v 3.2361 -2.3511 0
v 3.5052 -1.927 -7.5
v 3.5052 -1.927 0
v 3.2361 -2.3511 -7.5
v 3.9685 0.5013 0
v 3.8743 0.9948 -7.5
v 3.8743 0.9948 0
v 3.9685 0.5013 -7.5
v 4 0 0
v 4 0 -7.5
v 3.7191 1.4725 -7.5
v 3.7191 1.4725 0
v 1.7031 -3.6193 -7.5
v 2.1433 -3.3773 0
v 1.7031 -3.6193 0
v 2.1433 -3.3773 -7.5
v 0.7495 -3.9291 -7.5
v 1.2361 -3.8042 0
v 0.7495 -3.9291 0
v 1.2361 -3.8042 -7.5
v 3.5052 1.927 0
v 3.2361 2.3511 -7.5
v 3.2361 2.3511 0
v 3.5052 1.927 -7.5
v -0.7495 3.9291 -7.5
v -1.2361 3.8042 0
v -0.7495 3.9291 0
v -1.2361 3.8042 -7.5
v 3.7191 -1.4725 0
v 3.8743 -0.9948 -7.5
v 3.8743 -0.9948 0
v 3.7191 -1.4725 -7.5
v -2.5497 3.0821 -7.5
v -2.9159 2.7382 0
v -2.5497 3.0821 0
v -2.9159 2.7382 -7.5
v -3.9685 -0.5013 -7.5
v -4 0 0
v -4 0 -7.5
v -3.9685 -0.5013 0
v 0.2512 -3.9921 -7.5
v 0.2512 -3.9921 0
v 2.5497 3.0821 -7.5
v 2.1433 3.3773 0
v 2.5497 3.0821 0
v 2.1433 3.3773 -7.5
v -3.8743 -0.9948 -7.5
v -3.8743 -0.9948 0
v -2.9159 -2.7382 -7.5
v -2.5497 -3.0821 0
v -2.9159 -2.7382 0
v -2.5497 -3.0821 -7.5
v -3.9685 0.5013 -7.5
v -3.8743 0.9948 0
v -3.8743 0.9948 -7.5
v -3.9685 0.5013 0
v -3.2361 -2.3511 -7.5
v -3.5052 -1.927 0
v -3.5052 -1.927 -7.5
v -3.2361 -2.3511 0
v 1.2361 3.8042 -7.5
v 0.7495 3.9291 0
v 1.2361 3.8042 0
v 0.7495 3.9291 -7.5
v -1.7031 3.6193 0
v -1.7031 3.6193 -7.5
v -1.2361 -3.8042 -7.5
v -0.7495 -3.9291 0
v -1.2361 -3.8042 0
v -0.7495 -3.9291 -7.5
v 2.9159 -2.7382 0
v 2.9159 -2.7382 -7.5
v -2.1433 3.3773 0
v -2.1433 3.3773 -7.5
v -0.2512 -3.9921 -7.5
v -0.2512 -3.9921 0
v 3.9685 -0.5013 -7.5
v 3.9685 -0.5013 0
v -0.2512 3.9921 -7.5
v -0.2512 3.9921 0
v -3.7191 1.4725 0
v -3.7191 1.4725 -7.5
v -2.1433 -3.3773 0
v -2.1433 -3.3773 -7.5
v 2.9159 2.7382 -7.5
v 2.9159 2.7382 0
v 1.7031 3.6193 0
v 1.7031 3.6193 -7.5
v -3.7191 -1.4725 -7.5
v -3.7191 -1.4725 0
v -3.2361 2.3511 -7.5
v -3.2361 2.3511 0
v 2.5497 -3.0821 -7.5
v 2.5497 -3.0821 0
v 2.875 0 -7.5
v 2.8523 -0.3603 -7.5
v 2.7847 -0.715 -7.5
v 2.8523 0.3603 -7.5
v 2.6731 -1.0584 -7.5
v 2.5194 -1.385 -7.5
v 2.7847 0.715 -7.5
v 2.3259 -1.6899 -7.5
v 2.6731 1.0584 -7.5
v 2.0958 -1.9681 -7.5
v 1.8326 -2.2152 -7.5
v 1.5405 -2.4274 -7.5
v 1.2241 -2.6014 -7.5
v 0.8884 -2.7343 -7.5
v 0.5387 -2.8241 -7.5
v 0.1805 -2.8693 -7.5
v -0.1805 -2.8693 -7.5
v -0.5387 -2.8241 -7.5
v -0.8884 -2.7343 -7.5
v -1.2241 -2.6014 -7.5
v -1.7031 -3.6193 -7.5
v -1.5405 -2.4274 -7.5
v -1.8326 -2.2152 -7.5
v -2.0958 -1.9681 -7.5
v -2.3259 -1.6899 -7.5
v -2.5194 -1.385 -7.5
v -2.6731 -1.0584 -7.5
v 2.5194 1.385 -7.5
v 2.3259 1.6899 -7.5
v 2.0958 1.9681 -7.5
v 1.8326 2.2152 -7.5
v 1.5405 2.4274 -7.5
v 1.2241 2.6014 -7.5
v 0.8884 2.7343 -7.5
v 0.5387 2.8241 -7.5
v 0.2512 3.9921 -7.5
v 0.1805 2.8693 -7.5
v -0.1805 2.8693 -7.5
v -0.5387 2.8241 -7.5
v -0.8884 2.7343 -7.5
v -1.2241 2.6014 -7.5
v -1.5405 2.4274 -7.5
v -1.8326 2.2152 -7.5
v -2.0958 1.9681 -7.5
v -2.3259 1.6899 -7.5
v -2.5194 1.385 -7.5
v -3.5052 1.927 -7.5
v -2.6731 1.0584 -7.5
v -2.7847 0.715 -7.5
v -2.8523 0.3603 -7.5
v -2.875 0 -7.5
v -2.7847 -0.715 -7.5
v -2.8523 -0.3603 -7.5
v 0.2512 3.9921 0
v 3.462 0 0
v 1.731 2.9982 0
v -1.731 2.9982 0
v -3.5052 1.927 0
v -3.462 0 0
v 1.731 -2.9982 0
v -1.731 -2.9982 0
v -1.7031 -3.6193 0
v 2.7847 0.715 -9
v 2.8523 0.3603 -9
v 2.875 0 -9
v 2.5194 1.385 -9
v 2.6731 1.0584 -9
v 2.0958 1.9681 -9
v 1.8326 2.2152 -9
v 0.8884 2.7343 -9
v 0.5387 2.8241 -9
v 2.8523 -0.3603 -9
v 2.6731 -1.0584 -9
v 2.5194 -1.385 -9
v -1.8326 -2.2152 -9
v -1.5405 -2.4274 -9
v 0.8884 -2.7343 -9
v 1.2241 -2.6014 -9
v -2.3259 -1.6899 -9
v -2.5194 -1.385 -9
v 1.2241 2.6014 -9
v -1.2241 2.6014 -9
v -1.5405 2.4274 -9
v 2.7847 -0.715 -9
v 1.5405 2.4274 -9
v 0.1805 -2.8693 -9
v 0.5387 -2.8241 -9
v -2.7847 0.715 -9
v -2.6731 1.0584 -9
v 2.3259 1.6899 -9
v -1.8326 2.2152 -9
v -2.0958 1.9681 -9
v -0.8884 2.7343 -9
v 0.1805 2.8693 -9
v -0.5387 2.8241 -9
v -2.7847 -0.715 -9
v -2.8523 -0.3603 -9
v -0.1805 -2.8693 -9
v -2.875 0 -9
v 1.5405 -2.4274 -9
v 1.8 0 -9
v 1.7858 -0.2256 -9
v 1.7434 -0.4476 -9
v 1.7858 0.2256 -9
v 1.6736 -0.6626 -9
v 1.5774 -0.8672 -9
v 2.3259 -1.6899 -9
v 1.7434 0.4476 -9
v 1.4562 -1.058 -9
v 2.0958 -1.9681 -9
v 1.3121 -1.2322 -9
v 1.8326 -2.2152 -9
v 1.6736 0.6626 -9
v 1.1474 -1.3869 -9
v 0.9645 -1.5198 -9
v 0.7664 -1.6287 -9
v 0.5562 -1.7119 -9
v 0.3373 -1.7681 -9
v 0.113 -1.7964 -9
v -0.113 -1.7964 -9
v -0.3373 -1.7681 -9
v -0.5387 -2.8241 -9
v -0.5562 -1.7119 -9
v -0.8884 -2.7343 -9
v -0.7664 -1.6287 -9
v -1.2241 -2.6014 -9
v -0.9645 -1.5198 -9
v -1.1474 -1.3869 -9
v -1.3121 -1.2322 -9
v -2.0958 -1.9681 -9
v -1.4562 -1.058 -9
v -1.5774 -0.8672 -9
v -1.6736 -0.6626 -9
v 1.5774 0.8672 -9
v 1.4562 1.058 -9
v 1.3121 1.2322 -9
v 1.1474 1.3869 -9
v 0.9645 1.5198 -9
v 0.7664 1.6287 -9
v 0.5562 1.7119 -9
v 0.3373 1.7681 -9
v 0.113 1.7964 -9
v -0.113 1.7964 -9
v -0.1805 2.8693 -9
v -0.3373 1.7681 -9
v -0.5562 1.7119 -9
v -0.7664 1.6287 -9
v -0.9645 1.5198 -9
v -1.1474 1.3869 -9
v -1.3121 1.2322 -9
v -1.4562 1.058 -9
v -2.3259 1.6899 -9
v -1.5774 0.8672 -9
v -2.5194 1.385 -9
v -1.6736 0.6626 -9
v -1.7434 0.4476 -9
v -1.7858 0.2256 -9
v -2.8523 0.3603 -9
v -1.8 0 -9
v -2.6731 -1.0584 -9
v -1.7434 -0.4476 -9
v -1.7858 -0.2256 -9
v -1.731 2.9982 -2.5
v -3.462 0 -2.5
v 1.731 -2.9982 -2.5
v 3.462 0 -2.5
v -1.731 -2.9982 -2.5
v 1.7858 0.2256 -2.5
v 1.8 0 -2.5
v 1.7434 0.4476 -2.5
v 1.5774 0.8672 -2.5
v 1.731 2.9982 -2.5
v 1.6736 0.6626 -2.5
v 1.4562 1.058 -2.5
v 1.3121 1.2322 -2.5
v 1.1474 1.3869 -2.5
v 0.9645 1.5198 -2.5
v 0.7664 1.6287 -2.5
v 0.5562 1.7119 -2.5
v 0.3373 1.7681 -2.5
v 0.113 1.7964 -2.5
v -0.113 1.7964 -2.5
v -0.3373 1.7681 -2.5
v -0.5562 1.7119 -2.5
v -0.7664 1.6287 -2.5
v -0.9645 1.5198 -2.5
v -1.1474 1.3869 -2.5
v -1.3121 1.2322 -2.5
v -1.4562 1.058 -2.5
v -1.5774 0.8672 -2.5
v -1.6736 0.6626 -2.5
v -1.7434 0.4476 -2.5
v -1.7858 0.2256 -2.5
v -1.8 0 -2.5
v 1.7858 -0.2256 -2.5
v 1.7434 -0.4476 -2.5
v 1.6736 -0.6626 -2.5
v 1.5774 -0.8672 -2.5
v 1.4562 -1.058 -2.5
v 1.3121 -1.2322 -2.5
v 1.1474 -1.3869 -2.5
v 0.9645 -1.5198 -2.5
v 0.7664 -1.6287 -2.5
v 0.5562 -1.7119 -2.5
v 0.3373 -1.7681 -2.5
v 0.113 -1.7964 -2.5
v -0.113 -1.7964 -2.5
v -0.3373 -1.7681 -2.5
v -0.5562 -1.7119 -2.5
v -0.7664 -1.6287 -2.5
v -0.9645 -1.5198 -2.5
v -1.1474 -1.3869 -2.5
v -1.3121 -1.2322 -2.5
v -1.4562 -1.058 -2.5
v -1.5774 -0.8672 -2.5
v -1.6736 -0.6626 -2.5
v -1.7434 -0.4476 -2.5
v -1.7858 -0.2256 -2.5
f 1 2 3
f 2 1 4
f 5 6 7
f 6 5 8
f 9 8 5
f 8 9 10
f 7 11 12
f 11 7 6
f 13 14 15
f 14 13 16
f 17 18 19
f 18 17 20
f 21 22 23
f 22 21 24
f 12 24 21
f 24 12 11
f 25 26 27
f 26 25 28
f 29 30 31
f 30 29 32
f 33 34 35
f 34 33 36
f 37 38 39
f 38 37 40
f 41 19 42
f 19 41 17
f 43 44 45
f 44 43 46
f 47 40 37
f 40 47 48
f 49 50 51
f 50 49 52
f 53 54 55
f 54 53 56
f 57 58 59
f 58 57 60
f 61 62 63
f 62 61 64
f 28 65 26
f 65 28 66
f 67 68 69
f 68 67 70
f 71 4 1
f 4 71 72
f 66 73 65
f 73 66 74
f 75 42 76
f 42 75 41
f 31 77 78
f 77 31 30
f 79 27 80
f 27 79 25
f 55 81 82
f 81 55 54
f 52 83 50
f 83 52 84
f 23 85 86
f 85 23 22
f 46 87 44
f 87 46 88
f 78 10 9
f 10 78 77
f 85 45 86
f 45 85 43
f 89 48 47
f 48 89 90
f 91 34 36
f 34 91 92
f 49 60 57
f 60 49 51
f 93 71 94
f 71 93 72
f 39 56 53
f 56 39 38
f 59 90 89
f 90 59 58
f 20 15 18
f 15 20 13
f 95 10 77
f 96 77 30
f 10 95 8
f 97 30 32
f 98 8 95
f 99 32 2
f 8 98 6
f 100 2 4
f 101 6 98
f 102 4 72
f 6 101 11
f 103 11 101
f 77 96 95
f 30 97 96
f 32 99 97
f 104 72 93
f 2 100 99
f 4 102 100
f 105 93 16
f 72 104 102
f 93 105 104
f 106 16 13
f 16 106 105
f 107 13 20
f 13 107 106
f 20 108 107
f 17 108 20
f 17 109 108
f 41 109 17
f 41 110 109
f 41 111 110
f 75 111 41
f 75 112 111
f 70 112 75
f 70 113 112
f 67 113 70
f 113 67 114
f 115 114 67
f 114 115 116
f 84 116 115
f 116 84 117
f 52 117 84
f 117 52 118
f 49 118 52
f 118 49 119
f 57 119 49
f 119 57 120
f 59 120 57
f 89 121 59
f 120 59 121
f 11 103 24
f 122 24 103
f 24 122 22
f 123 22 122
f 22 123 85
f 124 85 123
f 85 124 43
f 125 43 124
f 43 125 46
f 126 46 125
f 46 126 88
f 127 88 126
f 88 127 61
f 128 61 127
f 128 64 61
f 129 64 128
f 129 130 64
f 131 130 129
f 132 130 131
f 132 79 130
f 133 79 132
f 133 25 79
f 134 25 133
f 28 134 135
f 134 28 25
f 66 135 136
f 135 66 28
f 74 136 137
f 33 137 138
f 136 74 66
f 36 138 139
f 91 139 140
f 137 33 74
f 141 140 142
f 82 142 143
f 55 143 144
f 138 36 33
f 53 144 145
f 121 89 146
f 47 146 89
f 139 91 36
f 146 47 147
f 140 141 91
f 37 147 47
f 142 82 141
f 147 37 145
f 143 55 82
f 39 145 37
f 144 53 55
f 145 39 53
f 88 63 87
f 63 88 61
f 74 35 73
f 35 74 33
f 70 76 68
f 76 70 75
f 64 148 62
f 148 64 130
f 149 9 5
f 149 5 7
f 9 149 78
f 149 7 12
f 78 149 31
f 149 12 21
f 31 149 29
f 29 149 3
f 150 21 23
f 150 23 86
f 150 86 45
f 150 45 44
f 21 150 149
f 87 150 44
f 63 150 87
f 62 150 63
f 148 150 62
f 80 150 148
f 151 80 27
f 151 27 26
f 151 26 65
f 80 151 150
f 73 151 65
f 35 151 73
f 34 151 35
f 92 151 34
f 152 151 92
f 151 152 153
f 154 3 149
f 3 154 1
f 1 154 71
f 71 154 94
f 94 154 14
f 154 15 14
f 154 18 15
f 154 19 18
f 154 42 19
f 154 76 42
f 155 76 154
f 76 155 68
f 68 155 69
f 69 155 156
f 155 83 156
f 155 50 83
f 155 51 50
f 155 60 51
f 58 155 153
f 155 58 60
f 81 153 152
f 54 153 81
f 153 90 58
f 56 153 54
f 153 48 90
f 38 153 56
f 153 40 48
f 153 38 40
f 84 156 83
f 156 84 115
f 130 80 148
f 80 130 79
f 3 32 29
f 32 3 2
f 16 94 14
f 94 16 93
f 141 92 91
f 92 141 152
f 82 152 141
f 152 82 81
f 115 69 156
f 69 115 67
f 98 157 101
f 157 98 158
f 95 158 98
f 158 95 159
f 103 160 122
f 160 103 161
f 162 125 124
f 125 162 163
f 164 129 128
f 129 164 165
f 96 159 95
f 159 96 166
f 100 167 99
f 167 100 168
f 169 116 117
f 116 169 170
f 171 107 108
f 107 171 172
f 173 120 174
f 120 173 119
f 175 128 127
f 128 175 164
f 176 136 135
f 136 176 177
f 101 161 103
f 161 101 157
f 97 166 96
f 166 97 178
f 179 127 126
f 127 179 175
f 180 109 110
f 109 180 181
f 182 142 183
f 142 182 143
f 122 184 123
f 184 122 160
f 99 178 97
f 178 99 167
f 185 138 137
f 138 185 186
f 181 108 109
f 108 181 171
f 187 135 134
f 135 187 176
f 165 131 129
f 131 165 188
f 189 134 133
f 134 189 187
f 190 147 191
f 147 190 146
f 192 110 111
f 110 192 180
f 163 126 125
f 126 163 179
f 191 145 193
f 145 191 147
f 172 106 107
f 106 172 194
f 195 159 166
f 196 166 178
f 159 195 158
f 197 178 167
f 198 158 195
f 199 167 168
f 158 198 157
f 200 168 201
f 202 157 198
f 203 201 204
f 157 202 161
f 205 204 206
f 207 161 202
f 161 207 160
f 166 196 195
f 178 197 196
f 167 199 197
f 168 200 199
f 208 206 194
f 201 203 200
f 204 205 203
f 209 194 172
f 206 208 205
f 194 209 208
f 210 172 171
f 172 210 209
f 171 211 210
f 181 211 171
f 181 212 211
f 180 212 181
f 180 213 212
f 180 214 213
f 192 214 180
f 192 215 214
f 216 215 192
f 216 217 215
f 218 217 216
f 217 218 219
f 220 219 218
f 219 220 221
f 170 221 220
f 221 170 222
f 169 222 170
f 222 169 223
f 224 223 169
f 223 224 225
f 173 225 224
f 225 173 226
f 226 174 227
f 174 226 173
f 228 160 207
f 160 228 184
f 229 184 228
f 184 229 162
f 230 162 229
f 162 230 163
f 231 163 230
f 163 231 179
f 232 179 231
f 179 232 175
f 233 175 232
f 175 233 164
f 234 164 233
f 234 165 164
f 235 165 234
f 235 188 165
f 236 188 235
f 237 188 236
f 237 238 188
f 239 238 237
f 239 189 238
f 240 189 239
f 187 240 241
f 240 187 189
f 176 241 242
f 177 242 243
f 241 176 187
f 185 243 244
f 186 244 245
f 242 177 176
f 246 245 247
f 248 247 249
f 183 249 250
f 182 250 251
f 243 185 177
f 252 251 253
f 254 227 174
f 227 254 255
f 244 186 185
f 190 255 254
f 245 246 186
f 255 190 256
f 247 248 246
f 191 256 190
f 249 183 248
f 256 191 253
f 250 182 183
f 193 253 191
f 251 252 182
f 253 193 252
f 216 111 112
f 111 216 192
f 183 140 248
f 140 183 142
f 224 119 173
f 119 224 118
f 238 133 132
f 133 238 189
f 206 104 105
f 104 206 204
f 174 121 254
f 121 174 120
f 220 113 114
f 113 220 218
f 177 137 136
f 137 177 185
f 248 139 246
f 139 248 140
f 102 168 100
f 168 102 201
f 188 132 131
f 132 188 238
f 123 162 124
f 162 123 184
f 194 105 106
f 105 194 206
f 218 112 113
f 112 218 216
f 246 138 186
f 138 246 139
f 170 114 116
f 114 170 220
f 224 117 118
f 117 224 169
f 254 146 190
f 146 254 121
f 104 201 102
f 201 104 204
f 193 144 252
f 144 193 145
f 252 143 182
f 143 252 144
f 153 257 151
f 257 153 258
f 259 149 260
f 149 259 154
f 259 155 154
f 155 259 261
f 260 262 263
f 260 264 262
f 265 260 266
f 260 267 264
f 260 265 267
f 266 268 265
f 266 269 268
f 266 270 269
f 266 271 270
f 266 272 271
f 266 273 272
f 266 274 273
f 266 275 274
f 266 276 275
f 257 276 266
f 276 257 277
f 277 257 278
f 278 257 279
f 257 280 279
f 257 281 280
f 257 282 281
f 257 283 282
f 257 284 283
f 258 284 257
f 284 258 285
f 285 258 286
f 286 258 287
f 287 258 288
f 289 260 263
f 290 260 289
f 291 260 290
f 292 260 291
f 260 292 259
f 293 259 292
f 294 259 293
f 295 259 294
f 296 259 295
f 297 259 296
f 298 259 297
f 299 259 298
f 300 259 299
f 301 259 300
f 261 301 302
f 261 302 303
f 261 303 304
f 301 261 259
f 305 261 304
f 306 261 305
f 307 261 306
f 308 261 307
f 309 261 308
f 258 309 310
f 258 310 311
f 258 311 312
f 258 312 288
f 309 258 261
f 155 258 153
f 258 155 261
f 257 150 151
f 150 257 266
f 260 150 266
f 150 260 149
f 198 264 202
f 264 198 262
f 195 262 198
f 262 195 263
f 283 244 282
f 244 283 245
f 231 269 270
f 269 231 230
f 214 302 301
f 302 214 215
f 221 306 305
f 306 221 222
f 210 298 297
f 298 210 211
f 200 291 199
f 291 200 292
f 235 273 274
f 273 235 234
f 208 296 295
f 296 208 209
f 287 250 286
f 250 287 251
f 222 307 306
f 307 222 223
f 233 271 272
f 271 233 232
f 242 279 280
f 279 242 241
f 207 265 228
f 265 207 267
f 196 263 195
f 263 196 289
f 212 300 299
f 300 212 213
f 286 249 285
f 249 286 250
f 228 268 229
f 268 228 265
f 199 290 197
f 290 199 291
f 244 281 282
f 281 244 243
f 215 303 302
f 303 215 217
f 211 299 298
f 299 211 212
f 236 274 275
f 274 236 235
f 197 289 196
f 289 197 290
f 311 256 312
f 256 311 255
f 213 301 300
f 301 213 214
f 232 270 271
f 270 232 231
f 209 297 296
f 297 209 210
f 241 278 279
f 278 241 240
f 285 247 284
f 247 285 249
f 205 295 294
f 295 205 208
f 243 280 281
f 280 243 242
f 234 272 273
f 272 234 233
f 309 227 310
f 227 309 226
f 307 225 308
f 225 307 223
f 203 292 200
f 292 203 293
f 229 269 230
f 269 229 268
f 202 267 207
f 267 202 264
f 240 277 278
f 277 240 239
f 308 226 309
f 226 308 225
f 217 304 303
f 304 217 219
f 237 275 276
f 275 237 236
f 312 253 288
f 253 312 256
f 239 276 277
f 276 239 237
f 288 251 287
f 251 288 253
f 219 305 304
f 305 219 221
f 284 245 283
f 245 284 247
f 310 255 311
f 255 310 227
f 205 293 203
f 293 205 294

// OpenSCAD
$fn = 50;

difference() {
	union() {
		translate(v = [0, 0, -7.5]) {
			cylinder(h = 7.5, r = 4.0);
		}
		#translate(v = [0, 0, -9.0]) {
			cylinder(h = 9, r = 2.875);
		}
	}
	union() {
		translate(v = [0, 0, 0]) {
			rotate(a = [0, 0, 0]) {
				difference() {
					union() {
						translate(v = [0, 0, -2.5]) {
							linear_extrude(height = 2.5) {
								polygon(points = [[3.4619999999999997, 0.0], [1.7310000000000003, 2.9981799479017264], [-1.7309999999999992, 2.9981799479017264], [-3.4619999999999997, 4.2397272186481365e-16], [-1.7310000000000014, -2.998179947901726], [1.7309999999999977, -2.9981799479017277]]);
							}
						}
					}
					union();
				}
			}
		}
		#translate(v = [0, 0, -100.0]) {
			cylinder(h = 200, r = 1.8);
		}
	}
}
